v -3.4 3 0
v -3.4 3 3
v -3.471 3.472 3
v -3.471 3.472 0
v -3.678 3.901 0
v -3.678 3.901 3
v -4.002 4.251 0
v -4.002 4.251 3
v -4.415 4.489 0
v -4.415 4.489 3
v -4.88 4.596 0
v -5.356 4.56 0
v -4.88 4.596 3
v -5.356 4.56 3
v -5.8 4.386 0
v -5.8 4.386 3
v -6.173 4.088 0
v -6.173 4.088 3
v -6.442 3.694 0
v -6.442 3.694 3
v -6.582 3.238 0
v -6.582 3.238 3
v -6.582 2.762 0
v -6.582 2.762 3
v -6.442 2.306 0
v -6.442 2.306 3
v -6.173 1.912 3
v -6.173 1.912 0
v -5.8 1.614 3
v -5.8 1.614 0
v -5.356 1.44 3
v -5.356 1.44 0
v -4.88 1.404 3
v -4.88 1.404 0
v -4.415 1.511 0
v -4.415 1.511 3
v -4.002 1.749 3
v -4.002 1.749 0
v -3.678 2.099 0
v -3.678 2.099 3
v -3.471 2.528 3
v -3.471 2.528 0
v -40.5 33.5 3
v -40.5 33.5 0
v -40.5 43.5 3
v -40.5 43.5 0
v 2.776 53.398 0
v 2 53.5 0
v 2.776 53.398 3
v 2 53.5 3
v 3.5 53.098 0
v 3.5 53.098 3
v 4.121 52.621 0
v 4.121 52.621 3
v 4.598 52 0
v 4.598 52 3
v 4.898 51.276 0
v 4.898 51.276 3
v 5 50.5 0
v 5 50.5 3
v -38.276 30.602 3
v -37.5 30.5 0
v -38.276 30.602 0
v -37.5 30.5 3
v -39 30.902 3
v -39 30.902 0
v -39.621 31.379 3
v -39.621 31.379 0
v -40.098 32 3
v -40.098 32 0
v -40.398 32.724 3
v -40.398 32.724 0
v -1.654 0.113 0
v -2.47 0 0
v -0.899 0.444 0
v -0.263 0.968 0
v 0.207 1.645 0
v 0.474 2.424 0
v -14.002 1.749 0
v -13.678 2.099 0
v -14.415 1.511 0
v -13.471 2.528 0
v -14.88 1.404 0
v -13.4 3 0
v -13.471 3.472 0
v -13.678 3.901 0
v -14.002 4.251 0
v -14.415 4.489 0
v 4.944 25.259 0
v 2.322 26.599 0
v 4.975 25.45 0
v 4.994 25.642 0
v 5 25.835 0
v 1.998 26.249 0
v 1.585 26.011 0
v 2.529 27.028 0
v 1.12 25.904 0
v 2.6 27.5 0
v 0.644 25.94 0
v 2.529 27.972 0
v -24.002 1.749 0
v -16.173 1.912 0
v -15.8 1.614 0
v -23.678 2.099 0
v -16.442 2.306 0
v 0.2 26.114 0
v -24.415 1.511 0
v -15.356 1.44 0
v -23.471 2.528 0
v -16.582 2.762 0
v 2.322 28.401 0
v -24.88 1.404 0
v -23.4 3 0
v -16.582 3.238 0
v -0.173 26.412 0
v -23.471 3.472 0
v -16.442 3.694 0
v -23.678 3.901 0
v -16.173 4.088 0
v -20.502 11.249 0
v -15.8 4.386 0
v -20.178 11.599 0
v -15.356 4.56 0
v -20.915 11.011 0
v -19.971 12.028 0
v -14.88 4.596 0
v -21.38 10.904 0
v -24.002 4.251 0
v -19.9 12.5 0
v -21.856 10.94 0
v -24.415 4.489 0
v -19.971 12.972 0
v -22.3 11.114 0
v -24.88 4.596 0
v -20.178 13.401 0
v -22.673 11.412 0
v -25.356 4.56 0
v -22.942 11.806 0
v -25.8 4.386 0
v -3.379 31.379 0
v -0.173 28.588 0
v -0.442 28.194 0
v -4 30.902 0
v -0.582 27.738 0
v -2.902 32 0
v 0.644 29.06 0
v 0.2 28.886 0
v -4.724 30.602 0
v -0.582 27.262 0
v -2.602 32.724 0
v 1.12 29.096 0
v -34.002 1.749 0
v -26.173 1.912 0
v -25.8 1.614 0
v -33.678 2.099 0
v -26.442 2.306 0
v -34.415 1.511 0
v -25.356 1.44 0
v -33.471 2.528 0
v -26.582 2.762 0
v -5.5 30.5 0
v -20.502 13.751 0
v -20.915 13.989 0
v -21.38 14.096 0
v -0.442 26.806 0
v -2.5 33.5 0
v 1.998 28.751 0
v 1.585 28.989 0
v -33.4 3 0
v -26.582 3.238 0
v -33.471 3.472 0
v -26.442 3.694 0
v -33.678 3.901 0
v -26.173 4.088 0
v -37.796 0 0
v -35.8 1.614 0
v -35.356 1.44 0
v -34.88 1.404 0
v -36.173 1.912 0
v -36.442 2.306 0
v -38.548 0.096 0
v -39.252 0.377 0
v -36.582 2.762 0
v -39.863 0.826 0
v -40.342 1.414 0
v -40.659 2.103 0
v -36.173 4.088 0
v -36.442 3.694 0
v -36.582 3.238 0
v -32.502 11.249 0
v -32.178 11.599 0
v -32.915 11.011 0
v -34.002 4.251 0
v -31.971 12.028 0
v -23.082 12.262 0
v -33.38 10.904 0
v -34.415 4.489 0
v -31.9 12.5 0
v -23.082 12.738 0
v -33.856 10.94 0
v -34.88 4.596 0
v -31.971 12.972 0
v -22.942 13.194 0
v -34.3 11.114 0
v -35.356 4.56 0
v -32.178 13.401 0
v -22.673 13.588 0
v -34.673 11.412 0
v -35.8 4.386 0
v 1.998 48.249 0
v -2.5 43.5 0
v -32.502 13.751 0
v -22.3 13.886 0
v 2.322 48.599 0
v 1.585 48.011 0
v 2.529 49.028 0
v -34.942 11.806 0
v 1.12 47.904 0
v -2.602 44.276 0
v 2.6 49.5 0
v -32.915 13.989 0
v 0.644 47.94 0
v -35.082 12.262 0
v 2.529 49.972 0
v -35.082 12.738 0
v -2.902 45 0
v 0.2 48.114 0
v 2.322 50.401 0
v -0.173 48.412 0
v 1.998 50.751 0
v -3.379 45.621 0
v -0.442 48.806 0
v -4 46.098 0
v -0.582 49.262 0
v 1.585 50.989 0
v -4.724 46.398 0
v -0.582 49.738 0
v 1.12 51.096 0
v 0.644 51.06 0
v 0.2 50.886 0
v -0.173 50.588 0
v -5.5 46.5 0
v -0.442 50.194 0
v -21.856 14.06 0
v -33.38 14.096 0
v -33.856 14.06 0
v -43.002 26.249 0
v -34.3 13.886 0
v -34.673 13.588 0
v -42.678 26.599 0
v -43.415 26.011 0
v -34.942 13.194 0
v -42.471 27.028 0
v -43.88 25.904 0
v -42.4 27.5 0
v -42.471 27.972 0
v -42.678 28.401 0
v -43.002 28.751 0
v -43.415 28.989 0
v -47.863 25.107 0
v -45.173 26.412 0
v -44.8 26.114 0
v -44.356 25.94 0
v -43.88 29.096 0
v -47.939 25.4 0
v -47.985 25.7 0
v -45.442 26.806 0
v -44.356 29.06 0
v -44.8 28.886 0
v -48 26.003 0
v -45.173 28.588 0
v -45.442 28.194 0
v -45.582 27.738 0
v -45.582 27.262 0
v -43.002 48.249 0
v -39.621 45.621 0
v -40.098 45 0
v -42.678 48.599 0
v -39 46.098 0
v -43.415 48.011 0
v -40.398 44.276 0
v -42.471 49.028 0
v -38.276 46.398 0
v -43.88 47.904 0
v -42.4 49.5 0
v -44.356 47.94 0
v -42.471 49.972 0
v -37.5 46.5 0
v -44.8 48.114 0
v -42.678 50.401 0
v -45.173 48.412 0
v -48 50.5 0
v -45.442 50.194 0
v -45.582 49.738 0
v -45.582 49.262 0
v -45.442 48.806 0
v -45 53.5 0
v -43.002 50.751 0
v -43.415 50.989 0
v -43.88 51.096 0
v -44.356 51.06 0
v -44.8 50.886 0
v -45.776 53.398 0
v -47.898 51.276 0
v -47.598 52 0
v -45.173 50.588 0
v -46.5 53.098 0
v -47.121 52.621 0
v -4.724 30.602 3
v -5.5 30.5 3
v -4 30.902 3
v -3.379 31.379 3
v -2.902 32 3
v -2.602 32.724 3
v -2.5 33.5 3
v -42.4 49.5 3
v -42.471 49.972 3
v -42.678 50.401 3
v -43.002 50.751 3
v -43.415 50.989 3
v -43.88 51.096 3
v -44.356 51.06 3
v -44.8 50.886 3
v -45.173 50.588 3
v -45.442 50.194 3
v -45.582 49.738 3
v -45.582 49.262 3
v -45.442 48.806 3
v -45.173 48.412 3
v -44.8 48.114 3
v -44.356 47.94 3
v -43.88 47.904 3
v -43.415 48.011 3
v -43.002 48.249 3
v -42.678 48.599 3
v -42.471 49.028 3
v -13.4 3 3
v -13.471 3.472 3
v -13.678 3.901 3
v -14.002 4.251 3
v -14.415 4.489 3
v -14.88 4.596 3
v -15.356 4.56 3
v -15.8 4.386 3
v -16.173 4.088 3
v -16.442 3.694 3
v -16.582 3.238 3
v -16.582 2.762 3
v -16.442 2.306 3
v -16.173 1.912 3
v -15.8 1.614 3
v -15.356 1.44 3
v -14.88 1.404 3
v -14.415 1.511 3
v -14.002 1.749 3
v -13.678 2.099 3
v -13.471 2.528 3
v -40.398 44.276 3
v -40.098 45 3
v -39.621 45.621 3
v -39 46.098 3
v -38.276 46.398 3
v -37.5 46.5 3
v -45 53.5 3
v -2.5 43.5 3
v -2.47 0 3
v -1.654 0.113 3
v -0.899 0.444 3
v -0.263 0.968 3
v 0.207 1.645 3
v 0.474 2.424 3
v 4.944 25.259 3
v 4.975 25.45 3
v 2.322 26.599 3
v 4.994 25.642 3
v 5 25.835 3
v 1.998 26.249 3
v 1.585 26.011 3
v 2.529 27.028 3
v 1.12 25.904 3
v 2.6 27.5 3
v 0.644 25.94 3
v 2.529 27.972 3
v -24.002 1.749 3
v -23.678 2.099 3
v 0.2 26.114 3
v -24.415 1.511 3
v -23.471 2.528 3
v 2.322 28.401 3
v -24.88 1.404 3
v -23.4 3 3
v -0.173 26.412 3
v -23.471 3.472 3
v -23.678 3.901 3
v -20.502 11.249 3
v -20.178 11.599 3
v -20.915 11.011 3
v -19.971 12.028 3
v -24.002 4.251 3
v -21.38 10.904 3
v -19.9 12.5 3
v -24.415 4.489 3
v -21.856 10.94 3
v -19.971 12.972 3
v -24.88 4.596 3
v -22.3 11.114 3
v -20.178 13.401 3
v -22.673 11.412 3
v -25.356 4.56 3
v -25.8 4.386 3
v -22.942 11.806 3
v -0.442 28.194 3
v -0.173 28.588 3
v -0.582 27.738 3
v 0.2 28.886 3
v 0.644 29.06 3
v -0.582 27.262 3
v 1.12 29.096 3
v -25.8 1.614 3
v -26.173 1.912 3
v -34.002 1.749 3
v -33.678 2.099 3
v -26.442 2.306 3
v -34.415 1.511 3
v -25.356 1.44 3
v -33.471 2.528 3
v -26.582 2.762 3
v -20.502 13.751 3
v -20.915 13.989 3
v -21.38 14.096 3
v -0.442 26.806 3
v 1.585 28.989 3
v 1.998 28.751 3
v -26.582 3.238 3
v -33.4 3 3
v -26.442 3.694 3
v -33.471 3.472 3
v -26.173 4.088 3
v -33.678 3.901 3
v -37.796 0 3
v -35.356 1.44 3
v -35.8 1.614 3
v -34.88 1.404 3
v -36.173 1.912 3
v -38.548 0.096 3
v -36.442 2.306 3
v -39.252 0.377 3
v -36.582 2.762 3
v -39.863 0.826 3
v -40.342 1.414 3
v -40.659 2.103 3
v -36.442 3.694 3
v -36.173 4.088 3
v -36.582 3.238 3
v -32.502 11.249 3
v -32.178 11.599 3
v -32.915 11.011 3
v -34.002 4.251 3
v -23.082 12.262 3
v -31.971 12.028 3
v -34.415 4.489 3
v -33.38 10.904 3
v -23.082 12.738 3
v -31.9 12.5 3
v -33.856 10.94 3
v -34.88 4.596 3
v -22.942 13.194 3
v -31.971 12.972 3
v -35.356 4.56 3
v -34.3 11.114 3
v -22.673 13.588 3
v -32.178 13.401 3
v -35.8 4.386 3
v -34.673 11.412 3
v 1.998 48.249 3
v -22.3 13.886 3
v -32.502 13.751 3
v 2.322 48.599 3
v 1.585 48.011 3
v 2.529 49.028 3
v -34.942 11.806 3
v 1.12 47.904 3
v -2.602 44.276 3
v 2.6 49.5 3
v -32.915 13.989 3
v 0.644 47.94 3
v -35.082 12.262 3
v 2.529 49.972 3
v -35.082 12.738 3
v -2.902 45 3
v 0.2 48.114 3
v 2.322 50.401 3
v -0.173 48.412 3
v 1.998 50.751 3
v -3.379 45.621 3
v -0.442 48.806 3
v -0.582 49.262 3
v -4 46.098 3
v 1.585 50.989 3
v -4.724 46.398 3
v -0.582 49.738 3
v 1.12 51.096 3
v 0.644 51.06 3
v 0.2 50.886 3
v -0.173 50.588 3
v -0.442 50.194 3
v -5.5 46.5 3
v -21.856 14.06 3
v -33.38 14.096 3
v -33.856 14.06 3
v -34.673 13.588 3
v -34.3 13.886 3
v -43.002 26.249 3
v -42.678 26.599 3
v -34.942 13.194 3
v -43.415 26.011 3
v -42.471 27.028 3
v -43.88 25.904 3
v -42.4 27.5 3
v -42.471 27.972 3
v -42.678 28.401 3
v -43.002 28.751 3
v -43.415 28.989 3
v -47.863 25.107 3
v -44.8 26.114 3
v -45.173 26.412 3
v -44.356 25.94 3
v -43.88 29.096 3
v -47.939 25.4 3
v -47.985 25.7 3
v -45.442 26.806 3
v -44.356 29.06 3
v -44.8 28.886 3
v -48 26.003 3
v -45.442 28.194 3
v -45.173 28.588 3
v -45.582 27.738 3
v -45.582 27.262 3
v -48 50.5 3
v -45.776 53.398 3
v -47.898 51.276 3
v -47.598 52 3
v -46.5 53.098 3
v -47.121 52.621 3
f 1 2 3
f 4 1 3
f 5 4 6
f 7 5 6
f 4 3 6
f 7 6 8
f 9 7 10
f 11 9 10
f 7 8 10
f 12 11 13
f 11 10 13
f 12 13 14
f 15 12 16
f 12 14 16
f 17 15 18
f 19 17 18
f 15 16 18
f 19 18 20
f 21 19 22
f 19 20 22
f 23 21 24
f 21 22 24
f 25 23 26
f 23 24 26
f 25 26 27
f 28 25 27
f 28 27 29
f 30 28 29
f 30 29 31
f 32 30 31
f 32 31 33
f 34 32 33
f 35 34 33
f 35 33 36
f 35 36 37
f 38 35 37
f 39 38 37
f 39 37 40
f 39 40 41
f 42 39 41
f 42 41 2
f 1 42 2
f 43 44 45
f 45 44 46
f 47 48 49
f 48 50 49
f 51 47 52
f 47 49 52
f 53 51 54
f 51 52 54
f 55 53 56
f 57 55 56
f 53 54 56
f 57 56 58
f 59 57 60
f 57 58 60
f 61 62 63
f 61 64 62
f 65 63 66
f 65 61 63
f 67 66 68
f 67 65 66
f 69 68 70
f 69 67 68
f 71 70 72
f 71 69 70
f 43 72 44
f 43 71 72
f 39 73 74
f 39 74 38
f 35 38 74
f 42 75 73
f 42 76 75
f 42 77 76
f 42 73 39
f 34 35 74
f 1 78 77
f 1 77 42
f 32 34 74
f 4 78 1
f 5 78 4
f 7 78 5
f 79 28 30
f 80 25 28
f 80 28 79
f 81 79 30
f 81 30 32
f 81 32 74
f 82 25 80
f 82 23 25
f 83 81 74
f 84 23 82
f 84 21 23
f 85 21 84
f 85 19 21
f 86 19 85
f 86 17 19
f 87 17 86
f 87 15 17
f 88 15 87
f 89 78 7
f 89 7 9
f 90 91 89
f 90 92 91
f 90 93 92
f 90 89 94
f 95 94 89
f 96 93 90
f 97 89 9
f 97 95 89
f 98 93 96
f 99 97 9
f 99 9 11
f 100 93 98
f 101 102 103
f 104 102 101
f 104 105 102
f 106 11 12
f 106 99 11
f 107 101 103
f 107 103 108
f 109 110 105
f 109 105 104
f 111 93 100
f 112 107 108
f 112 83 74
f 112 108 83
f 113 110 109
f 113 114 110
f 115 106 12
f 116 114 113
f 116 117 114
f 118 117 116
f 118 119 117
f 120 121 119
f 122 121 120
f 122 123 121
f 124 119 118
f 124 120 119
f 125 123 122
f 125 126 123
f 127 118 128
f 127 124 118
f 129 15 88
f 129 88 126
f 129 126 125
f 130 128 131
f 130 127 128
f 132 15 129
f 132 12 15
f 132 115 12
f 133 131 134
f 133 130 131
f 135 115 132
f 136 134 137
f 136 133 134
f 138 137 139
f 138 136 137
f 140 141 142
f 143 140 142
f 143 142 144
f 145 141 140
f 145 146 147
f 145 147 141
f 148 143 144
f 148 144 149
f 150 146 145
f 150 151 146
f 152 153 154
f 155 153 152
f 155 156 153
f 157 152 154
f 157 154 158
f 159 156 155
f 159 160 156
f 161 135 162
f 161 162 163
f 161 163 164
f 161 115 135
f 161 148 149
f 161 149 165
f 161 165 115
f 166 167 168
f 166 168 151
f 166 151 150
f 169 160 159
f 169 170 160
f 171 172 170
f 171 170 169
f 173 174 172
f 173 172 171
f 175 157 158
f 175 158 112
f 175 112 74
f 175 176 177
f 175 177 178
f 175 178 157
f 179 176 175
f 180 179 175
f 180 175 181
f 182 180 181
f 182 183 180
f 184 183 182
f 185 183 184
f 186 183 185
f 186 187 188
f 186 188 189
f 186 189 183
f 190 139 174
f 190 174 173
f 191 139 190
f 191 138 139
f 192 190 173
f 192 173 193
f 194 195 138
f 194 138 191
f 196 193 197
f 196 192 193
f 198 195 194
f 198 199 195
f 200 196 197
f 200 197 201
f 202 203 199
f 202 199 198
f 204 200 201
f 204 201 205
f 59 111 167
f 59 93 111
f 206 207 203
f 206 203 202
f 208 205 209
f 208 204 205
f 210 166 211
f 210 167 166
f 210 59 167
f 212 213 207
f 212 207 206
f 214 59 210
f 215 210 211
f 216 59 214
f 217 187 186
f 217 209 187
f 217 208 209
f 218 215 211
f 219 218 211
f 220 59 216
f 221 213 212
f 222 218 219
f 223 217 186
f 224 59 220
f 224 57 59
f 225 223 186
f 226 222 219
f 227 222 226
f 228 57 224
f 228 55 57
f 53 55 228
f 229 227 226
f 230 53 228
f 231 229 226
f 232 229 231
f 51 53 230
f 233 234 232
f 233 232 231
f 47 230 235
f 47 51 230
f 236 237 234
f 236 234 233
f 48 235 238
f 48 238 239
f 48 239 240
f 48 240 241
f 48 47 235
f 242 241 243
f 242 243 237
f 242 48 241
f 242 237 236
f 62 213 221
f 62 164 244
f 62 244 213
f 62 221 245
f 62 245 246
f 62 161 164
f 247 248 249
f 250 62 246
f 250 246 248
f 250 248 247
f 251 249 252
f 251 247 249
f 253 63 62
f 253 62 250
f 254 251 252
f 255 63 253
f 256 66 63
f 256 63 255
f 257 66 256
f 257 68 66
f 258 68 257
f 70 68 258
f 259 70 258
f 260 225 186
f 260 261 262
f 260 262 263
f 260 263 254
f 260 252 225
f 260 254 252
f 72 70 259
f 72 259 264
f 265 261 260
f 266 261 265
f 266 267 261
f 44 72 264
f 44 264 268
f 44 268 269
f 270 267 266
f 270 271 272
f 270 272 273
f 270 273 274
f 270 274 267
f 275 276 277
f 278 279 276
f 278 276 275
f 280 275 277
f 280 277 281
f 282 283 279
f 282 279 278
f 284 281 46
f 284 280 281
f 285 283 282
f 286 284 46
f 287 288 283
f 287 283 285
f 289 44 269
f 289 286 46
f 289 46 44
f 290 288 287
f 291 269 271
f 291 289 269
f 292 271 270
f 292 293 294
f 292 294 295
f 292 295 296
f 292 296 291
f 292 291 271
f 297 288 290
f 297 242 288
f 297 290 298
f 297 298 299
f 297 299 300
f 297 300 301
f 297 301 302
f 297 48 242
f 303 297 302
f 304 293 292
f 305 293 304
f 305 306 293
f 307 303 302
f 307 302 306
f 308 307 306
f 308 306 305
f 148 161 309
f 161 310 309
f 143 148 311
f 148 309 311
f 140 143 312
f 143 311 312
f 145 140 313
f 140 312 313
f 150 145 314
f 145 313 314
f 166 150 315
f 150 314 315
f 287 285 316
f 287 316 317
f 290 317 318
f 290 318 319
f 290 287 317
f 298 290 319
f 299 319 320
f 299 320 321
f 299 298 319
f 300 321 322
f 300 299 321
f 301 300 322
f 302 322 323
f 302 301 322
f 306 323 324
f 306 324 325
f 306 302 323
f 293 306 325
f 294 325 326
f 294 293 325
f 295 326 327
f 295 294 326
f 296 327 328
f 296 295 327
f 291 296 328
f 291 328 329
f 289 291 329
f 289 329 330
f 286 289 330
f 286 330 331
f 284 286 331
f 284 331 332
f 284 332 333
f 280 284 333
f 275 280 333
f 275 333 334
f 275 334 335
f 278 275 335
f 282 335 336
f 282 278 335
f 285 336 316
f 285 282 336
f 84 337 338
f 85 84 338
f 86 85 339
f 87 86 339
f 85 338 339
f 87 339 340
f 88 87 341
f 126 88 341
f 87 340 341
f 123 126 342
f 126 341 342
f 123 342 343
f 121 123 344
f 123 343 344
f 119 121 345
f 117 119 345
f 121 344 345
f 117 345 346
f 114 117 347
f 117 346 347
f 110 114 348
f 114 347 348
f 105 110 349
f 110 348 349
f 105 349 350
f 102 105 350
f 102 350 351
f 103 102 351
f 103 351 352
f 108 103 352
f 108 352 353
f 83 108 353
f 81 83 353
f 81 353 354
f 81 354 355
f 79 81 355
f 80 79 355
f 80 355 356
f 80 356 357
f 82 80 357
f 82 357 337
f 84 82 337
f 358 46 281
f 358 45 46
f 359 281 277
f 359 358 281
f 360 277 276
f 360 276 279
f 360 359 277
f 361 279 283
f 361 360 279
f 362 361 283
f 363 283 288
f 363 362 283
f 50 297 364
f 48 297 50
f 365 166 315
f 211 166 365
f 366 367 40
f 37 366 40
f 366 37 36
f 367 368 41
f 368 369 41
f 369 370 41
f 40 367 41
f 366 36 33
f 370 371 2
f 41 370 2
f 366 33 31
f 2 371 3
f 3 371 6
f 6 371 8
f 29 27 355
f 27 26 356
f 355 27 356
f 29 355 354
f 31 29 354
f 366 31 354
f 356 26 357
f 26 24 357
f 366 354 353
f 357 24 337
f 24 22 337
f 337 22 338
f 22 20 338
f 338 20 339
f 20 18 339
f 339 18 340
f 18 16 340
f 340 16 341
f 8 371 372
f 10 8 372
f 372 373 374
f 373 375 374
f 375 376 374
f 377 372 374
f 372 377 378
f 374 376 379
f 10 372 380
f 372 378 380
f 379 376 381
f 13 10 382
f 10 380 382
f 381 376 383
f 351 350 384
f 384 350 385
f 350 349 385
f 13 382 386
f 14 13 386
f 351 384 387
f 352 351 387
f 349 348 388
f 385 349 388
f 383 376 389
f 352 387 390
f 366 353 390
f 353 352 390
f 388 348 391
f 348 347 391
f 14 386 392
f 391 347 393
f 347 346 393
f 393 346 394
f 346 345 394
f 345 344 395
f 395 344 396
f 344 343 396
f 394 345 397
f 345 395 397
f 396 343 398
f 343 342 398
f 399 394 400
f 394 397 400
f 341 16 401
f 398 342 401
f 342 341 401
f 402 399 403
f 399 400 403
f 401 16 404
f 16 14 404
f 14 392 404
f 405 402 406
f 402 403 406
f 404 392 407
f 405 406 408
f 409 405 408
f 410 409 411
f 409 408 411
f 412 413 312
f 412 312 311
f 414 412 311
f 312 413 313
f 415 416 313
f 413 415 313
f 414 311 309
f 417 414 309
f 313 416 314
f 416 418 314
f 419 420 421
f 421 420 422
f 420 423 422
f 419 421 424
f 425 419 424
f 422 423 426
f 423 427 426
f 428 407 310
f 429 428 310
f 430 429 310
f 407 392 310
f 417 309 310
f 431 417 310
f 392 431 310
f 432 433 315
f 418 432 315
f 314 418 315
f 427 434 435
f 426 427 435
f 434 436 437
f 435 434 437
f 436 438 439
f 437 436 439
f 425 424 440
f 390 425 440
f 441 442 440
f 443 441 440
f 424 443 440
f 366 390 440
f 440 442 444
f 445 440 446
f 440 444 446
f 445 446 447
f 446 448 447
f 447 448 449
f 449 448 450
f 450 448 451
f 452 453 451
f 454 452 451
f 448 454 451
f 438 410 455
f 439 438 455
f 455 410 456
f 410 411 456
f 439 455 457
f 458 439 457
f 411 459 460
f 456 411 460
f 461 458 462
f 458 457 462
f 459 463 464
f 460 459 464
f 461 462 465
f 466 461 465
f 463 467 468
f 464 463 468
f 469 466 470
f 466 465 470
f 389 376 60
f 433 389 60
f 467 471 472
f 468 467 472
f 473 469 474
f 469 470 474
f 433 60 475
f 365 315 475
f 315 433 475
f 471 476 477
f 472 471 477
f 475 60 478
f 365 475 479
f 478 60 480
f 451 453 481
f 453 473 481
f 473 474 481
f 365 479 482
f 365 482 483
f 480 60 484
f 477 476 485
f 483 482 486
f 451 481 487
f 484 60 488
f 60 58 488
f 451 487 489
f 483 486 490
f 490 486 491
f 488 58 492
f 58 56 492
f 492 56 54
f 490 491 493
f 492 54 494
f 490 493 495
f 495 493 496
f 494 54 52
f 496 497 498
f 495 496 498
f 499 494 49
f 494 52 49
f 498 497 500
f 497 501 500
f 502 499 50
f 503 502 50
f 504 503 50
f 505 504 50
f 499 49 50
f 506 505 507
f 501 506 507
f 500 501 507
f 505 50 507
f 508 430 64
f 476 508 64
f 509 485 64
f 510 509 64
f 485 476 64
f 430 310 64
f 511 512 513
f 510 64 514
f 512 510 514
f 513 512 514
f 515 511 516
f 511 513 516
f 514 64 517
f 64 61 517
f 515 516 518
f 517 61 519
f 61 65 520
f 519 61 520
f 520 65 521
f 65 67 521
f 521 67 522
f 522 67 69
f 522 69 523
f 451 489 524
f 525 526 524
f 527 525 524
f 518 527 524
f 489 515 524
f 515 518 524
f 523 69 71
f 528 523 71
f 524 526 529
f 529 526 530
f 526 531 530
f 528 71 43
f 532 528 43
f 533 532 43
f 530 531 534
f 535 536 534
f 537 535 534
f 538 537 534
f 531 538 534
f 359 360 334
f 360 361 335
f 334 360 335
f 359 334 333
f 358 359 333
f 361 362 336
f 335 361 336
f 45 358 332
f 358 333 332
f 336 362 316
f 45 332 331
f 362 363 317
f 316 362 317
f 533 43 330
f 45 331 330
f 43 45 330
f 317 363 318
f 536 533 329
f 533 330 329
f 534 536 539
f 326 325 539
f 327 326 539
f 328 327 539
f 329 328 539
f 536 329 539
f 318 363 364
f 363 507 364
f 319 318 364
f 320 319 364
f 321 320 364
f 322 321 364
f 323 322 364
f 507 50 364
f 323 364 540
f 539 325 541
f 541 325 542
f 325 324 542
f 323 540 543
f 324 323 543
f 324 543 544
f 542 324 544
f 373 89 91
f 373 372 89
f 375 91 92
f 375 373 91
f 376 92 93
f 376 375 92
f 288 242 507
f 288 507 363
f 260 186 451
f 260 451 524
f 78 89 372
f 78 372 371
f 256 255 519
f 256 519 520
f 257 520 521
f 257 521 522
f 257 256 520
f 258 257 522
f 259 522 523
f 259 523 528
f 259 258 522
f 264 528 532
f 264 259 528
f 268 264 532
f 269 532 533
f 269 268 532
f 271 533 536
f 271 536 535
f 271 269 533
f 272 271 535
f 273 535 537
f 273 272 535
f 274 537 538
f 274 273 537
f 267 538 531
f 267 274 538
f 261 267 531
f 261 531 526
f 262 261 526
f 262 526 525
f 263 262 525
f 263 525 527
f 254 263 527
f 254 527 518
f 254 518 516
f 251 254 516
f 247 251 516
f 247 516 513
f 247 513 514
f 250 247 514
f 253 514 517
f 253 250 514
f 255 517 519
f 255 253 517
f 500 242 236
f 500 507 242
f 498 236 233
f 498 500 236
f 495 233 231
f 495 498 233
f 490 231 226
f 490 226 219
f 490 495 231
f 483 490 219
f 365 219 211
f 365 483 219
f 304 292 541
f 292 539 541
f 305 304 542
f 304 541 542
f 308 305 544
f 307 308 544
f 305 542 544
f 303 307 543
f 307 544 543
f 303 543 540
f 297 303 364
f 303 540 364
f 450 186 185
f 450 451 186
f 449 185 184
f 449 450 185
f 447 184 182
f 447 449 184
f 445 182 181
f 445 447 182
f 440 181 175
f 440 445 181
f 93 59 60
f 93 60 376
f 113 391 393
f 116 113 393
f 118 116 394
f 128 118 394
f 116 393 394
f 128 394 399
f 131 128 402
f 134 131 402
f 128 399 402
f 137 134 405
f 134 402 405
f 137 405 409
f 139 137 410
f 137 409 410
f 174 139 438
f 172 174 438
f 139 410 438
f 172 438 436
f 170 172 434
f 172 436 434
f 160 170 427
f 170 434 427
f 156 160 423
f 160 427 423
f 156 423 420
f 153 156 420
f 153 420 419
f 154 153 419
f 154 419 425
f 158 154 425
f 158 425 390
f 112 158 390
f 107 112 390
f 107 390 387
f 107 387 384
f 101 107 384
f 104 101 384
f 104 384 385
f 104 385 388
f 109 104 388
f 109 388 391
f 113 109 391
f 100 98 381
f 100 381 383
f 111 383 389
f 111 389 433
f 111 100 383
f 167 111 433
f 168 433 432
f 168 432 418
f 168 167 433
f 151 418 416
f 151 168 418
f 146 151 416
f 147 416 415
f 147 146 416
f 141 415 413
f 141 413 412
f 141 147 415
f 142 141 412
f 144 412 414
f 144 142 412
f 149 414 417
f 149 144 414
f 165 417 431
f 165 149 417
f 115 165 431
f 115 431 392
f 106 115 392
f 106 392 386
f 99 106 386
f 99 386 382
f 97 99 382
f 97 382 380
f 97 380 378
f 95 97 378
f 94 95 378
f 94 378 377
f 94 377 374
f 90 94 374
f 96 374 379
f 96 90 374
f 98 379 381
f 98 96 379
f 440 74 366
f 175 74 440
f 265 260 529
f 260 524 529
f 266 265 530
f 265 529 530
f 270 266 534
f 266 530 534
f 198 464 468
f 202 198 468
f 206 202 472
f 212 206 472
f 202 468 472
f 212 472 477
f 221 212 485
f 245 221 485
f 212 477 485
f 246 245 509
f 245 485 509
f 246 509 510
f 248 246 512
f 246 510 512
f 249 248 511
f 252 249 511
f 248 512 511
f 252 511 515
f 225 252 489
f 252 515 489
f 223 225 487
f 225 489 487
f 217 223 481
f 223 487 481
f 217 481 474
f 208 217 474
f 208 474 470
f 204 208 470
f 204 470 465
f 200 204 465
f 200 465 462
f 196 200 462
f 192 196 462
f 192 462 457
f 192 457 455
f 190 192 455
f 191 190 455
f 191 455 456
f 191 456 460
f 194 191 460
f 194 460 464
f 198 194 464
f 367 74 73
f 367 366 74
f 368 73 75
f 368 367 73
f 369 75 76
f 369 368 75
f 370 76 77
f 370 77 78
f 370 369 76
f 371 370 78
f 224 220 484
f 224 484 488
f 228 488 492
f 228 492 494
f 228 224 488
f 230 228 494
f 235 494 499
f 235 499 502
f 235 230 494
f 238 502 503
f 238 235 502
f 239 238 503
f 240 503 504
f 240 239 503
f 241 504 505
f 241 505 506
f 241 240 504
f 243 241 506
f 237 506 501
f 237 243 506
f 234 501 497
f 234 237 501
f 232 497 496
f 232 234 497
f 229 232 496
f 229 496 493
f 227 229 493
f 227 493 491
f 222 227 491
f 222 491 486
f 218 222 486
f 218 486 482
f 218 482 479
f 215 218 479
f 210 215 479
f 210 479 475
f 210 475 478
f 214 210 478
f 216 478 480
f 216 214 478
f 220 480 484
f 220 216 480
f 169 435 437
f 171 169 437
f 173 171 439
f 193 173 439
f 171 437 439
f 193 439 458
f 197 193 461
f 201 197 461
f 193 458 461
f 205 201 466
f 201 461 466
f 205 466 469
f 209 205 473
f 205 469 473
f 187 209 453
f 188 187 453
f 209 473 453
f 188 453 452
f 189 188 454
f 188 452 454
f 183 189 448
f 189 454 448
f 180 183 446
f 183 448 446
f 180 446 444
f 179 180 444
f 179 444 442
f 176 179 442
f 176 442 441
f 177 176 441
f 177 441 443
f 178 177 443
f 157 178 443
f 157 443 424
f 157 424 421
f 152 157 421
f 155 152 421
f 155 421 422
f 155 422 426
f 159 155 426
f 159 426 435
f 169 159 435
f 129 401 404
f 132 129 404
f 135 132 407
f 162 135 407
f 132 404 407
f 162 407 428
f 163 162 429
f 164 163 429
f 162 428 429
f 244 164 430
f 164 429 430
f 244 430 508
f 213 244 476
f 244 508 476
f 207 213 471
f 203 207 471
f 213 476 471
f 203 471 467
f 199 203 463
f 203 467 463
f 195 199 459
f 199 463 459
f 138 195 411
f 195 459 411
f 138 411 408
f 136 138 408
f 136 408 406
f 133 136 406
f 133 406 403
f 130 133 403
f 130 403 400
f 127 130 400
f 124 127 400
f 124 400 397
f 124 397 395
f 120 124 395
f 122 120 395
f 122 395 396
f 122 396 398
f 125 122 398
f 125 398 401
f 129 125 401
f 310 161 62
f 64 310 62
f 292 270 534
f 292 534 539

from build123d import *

# Parameters (mm, degrees)
SKETCH_1_R          = 1.6
EXTRUDE_1_DEPTH     = 3
SKETCH_2_R          = 1.6
CUT_EXTRUDE_1_DEPTH = 4
FILLET_1_R          = 3
SKETCH_4_R          = 1.6
CUT_EXTRUDE_2_DEPTH = 4
SKETCH_5_W          = 38
SKETCH_5_H          = 16
CUT_EXTRUDE_3_DEPTH = 4
FILLET_2_R          = 3


with BuildPart() as part:
    # 草图1 → 凸台-拉伸1 (new body)
    with BuildSketch(Plane.XY):
        Polygon((-40, 0), (-48, 25.544444444), (-48, 53.5), (5, 53.5), (5, 25.544444444), (0, 0), align=None)
        with Locations((-44, 49.5)):
            Circle(SKETCH_1_R, mode=Mode.SUBTRACT)
        with Locations((1, 49.5)):
            Circle(SKETCH_1_R, mode=Mode.SUBTRACT)
        with Locations((1, 27.5)):
            Circle(SKETCH_1_R, mode=Mode.SUBTRACT)
        with Locations((-44, 27.5)):
            Circle(SKETCH_1_R, mode=Mode.SUBTRACT)
    extrude(amount=EXTRUDE_1_DEPTH)

    # 草图2 → 切除-拉伸1 (cut, through all)
    with BuildSketch(Plane.XY.offset(3)):
        with Locations((-5, 3)):
            Circle(SKETCH_2_R)
        with Locations((-15, 3)):
            Circle(SKETCH_2_R)
        with Locations((-25, 3)):
            Circle(SKETCH_2_R)
        with Locations((-35, 3)):
            Circle(SKETCH_2_R)
    extrude(amount=-CUT_EXTRUDE_1_DEPTH, mode=Mode.SUBTRACT)

    # 圆角1
    fillet_1_edges = [part.edges().sort_by_distance(p)[0] for p in [
        (0, 0, 1.5),
        (-40, 0, 1.5),
        (-48, 25.544444444, 1.5),
        (-48, 53.5, 1.5),
        (5, 53.5, 1.5),
        (5, 25.544444444, 1.5),
    ]]
    fillet(fillet_1_edges, radius=FILLET_1_R)

    # 草图4 → 切除-拉伸2 (cut, through all)
    with BuildSketch(Plane.XY.offset(3)):
        with Locations((-21.5, 36.5)):
            Circle(SKETCH_4_R)
        with Locations((-33.5, 12.5)):
            Circle(SKETCH_4_R)
        with Locations((-21.5, 12.5)):
            Circle(SKETCH_4_R)
    extrude(amount=-CUT_EXTRUDE_2_DEPTH, mode=Mode.SUBTRACT)

    # 草图5 → 切除-拉伸3 (cut, through all)
    with BuildSketch(Plane(origin=(0, 0, 0), x_dir=(-1, 0, 0), z_dir=(0, 0, -1))):
        with Locations((21.5, 38.5)):
            Rectangle(SKETCH_5_W, SKETCH_5_H)
    extrude(amount=-CUT_EXTRUDE_3_DEPTH, mode=Mode.SUBTRACT)

    # 圆角2
    fillet_2_edges = [part.edges().sort_by_distance(p)[0] for p in [
        (-40.5, 46.5, 1.5),
        (-40.5, 30.5, 1.5),
        (-2.5, 30.5, 1.5),
        (-2.5, 46.5, 1.5),
    ]]
    fillet(fillet_2_edges, radius=FILLET_2_R)


solid = part.part
